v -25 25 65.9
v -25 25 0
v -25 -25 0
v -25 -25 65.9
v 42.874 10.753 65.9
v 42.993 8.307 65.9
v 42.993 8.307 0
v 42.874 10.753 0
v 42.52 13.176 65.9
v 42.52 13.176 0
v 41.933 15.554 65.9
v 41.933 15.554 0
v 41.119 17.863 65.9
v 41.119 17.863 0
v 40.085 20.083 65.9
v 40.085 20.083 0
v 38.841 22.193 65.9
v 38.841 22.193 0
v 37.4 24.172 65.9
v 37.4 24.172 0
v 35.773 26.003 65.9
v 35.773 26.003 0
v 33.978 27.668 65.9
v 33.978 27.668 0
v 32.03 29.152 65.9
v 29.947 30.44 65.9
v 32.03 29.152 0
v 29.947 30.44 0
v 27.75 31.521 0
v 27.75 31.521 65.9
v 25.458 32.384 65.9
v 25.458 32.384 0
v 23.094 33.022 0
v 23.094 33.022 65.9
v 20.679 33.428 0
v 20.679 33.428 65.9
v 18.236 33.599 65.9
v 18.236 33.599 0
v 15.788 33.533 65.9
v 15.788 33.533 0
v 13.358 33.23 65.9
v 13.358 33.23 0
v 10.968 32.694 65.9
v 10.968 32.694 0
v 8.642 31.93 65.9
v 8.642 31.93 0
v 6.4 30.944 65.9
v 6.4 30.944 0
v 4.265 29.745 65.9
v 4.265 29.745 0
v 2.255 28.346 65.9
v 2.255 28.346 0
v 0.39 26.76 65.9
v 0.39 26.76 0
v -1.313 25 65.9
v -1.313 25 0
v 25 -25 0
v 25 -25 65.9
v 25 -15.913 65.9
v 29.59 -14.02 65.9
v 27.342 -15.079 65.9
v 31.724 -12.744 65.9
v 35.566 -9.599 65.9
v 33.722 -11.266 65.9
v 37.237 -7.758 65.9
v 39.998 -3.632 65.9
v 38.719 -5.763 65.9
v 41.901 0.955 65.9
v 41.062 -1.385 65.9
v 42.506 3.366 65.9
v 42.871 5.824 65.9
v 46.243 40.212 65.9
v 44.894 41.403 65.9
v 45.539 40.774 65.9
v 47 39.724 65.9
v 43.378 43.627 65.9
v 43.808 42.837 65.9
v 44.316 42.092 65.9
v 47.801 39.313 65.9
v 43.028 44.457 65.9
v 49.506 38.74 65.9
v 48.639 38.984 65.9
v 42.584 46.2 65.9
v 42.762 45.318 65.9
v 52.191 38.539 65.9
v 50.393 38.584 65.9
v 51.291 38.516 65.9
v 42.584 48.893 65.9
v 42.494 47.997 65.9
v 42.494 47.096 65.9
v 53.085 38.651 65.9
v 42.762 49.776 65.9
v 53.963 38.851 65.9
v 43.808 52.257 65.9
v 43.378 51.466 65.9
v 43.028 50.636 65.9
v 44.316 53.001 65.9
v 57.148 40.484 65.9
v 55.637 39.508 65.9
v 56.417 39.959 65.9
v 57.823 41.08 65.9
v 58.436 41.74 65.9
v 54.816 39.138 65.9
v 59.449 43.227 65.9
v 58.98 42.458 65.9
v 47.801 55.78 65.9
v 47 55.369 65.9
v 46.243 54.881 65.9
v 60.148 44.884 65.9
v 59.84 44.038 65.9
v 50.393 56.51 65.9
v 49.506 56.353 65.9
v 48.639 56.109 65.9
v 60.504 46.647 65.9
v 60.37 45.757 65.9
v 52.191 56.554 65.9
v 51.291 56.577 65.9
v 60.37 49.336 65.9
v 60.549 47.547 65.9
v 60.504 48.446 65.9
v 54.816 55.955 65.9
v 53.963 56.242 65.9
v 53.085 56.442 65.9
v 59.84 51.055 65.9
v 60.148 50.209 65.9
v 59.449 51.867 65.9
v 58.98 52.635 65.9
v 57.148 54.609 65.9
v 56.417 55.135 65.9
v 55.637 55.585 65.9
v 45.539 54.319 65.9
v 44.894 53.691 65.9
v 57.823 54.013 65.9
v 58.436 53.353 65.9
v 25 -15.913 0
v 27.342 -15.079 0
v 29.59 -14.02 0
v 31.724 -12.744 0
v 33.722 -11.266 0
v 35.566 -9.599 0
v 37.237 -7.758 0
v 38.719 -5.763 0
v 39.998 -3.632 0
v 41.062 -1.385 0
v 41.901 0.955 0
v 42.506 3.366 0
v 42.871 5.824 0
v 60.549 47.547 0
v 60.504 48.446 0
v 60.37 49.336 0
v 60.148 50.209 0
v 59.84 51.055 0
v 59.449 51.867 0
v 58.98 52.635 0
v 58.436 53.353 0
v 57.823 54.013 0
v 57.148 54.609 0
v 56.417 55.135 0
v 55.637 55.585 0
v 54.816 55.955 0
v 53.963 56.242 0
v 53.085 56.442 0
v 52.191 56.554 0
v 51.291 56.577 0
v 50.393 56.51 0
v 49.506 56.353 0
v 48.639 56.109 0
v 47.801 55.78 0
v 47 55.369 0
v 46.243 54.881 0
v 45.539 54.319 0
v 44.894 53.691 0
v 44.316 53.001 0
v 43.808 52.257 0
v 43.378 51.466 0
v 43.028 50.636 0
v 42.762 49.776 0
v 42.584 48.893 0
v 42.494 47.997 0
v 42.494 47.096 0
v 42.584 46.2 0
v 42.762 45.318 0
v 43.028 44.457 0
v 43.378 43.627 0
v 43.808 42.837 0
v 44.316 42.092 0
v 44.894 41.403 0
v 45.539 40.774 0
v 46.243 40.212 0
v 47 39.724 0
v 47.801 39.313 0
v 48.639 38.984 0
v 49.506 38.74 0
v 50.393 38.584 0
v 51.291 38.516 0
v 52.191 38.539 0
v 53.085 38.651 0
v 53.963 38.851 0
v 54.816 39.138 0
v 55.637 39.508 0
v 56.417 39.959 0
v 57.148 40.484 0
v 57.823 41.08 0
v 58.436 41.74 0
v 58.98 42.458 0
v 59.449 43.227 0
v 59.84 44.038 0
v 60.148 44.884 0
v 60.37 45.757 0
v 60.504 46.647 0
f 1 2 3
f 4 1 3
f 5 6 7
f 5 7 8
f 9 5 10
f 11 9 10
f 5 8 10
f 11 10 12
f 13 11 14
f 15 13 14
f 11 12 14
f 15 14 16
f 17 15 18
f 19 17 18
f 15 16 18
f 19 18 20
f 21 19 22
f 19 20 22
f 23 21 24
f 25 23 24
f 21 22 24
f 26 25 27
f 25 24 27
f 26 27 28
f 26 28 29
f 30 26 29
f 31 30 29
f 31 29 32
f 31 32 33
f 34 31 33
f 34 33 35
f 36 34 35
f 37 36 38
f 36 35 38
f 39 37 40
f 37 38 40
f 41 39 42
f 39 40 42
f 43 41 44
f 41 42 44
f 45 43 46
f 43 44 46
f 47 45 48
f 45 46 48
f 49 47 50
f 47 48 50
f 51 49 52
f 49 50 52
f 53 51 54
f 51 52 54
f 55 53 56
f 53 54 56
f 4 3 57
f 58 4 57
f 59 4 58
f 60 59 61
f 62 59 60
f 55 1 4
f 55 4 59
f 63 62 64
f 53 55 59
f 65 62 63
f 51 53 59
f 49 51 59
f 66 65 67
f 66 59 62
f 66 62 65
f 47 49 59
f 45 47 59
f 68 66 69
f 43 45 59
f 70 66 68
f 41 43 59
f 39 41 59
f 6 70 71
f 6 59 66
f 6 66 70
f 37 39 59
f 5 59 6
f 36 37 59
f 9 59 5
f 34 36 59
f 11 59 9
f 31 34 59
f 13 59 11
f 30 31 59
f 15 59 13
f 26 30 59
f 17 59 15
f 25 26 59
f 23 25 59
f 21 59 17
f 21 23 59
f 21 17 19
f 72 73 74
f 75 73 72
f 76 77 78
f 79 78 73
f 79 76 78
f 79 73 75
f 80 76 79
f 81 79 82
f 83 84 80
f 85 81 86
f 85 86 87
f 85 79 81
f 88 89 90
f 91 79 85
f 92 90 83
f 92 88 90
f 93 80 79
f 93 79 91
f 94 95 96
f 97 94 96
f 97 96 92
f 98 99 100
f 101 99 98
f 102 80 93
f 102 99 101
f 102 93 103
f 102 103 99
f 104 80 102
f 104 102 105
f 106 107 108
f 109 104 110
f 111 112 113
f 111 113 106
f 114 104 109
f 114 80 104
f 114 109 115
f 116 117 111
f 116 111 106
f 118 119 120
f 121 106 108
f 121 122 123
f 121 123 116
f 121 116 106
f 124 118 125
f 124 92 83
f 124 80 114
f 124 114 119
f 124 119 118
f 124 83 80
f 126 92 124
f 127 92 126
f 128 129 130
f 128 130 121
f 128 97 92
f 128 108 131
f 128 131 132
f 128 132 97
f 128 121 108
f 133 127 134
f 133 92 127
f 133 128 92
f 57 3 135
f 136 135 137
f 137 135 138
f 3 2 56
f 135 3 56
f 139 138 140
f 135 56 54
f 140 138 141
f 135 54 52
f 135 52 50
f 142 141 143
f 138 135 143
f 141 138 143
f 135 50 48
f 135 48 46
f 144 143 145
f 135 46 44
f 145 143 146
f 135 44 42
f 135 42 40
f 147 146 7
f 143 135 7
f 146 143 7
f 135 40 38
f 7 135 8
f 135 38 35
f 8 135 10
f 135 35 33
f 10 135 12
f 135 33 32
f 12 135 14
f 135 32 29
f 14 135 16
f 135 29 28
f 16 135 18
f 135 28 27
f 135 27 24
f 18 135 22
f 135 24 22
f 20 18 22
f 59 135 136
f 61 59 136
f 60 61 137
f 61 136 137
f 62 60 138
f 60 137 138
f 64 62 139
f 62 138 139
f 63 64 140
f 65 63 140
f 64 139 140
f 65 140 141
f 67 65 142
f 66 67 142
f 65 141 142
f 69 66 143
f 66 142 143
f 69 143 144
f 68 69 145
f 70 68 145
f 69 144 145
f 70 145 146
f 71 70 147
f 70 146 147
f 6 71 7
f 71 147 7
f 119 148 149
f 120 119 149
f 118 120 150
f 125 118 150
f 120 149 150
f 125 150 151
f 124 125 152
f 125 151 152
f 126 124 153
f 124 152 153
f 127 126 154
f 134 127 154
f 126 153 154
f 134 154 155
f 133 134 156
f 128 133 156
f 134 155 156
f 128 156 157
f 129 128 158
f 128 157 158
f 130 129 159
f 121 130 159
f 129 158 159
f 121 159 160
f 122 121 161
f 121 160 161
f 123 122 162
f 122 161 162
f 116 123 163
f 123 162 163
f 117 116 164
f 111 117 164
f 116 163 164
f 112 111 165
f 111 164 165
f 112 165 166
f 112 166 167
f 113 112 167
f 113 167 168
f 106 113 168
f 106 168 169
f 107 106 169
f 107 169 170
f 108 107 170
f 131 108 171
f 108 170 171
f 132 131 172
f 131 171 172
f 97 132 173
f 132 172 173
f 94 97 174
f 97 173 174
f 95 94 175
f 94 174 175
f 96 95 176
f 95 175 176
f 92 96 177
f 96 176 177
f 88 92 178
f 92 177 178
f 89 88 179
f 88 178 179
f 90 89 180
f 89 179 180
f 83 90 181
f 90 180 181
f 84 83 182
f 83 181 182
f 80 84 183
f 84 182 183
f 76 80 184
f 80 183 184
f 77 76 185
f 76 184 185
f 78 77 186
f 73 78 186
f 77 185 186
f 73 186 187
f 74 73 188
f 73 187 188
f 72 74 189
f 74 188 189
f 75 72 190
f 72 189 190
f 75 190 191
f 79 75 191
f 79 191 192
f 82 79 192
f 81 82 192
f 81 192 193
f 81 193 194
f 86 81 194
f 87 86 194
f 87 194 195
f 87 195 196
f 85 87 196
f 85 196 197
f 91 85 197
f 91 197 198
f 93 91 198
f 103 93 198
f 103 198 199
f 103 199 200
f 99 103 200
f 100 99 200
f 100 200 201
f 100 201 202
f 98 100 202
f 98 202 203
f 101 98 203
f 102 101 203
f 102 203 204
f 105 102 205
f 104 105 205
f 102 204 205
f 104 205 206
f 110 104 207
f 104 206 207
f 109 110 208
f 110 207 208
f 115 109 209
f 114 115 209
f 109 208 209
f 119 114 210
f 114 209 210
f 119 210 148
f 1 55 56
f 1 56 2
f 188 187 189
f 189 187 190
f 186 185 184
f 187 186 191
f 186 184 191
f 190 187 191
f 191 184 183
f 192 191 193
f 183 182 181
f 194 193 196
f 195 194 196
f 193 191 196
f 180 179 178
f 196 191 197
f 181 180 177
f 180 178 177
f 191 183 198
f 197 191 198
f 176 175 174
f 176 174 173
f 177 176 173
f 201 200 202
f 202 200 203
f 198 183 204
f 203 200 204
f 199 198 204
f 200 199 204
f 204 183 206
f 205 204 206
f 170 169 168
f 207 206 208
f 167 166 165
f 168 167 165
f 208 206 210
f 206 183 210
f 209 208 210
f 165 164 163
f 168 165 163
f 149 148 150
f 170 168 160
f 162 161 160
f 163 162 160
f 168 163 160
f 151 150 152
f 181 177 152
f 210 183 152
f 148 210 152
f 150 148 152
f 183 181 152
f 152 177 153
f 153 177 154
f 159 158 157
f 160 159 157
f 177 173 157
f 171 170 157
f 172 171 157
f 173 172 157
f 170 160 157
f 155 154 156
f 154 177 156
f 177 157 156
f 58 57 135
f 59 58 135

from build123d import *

# Parameters (mm, degrees)
F1_DEPTH = 50
F2_DEPTH = 65.9
F0_R     = 9.0330055622


with BuildPart() as f1:
    # F0 (on Top) → F1 (new body)
    with BuildSketch(Plane.XY):
        with BuildLine():
            Line((-1.3134458476, 25), (-25, 25))
            Line((-25, 25), (-25, -25))
            Line((-25, -25), (25, -25))
            Line((25, -25), (25, -15.9130819361))
            ThreePointArc((25, -15.9130819361), (-3.5820048642, -5.3773853976), (-1.3134458476, 25))
        make_face()
        with BuildLine():
            Line((25, 25), (-1.3134458476, 25))
            ThreePointArc((-1.3134458476, 25), (-3.5820048642, -5.3773853976), (25, -15.9130819361))
            Line((25, -15.9130819361), (25, 25))
        make_face()
    extrude(amount=F1_DEPTH)

    # F0 (on Top) → F2 (join)
    with BuildSketch(Plane.XY):
        with BuildLine():
            Line((-1.3134458476, 25), (-25, 25))
            Line((-25, 25), (-25, -25))
            Line((-25, -25), (25, -25))
            Line((25, -25), (25, -15.9130819361))
            ThreePointArc((25, -15.9130819361), (-3.5820048642, -5.3773853976), (-1.3134458476, 25))
        make_face()
        with BuildLine():
            ThreePointArc((42.9928339685, 8.3070602268), (26.6142674439, 31.9803609547), (-1.3134458476, 25))
            Line((-1.3134458476, 25), (25, 25))
            Line((25, 25), (25, -15.9130819361))
            ThreePointArc((25, -15.9130819361), (38.0023997126, -6.7790042087), (42.9928339685, 8.3070602268))
        make_face()
        with BuildLine():
            Line((25, 25), (-1.3134458476, 25))
            ThreePointArc((-1.3134458476, 25), (-3.5820048642, -5.3773853976), (25, -15.9130819361))
            Line((25, -15.9130819361), (25, 25))
        make_face()
    extrude(amount=F2_DEPTH)


with BuildPart() as f2:
    # F0 (on Top) → F2, piece 2 (new body)
    with BuildSketch(Plane.XY):
        with Locations((51.5161268413, 47.5466363132)):
            Circle(F0_R)
    extrude(amount=F2_DEPTH)


solid = Compound([f1.part, f2.part])
